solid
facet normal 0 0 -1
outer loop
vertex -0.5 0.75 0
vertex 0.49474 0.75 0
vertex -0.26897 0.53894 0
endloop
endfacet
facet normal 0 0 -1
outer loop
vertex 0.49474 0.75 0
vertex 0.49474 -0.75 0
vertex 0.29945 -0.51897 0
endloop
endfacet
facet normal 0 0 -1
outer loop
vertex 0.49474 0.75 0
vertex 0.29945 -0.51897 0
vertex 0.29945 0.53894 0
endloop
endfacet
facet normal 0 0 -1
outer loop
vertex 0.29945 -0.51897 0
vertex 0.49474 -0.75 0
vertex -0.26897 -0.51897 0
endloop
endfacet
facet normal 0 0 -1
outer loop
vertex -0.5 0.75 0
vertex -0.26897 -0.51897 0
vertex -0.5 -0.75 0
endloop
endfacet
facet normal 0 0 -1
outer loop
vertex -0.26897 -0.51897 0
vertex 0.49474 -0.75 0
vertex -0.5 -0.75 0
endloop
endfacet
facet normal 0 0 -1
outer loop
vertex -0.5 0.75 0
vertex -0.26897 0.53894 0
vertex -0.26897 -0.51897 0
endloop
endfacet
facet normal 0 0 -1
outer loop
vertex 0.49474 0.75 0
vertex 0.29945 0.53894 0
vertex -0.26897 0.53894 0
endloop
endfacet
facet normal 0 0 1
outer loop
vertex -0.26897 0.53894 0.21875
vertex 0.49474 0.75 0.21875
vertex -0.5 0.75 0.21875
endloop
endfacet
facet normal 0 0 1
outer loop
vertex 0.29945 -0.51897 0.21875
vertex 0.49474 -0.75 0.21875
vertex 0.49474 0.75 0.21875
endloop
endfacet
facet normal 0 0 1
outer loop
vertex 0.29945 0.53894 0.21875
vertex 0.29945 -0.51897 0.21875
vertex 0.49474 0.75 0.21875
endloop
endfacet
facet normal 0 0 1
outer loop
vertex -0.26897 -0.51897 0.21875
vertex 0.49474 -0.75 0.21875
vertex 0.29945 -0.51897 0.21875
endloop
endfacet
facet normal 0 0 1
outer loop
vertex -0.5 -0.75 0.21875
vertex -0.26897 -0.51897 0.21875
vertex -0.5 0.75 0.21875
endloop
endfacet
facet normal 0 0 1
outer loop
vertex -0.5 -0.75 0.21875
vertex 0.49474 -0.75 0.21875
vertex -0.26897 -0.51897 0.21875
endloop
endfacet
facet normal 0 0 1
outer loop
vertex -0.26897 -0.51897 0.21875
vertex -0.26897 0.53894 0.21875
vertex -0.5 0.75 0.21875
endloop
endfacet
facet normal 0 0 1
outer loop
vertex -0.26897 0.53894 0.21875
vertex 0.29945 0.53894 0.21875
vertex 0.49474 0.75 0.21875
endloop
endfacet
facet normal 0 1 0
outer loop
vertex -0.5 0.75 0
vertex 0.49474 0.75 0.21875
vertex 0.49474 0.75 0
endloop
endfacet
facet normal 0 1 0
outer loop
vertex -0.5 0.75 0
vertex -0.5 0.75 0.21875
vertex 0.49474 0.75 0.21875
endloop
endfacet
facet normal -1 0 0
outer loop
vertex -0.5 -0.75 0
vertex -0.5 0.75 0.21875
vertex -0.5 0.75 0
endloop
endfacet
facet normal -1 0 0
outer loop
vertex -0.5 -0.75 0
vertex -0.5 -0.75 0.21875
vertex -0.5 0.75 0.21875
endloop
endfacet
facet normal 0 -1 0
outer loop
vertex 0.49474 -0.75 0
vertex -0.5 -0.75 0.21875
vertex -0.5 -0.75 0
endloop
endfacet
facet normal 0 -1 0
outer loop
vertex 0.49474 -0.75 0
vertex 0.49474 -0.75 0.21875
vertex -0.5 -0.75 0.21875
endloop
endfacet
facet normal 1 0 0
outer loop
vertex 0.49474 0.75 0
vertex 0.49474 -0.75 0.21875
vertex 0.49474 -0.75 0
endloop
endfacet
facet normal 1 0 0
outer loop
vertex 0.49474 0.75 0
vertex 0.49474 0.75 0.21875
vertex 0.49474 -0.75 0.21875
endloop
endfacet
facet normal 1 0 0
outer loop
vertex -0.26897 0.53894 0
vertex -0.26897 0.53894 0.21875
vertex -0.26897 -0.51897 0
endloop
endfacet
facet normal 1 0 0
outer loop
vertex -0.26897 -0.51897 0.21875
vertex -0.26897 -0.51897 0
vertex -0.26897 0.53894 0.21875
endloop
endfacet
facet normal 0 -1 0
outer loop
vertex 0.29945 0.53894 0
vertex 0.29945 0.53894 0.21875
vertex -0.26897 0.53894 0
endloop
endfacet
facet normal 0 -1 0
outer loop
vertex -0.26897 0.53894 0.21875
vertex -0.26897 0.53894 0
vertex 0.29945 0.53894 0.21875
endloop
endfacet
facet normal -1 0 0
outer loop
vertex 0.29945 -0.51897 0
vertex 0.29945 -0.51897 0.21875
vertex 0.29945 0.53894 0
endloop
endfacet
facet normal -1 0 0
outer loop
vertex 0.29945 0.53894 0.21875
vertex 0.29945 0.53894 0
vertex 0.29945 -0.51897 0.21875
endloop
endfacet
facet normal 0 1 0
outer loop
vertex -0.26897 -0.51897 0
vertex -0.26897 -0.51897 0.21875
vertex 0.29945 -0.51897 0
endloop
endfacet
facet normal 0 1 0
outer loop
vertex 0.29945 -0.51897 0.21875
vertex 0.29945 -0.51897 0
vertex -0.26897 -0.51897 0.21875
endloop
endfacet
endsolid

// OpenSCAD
EPS = 0.01;

translate([-0.5, -0.75, 0])
rotate([0, 0, 0]) // Align with the XY plane
linear_extrude(height=0.21875)
difference() {
    union() {
        polygon(points=[[0.9947368421052631, 0.0], [0.9947368421052631, 1.5], [0.0, 1.5], [0.0, 0.0]]);
    }
    translate([EPS, EPS, 0])
    polygon(points=[[0.7894736842105263, 0.2210526315789474], [0.7894736842105263, 1.2789473684210526], [0.2210526315789474, 1.2789473684210526], [0.2210526315789474, 0.2210526315789474]]);
}
